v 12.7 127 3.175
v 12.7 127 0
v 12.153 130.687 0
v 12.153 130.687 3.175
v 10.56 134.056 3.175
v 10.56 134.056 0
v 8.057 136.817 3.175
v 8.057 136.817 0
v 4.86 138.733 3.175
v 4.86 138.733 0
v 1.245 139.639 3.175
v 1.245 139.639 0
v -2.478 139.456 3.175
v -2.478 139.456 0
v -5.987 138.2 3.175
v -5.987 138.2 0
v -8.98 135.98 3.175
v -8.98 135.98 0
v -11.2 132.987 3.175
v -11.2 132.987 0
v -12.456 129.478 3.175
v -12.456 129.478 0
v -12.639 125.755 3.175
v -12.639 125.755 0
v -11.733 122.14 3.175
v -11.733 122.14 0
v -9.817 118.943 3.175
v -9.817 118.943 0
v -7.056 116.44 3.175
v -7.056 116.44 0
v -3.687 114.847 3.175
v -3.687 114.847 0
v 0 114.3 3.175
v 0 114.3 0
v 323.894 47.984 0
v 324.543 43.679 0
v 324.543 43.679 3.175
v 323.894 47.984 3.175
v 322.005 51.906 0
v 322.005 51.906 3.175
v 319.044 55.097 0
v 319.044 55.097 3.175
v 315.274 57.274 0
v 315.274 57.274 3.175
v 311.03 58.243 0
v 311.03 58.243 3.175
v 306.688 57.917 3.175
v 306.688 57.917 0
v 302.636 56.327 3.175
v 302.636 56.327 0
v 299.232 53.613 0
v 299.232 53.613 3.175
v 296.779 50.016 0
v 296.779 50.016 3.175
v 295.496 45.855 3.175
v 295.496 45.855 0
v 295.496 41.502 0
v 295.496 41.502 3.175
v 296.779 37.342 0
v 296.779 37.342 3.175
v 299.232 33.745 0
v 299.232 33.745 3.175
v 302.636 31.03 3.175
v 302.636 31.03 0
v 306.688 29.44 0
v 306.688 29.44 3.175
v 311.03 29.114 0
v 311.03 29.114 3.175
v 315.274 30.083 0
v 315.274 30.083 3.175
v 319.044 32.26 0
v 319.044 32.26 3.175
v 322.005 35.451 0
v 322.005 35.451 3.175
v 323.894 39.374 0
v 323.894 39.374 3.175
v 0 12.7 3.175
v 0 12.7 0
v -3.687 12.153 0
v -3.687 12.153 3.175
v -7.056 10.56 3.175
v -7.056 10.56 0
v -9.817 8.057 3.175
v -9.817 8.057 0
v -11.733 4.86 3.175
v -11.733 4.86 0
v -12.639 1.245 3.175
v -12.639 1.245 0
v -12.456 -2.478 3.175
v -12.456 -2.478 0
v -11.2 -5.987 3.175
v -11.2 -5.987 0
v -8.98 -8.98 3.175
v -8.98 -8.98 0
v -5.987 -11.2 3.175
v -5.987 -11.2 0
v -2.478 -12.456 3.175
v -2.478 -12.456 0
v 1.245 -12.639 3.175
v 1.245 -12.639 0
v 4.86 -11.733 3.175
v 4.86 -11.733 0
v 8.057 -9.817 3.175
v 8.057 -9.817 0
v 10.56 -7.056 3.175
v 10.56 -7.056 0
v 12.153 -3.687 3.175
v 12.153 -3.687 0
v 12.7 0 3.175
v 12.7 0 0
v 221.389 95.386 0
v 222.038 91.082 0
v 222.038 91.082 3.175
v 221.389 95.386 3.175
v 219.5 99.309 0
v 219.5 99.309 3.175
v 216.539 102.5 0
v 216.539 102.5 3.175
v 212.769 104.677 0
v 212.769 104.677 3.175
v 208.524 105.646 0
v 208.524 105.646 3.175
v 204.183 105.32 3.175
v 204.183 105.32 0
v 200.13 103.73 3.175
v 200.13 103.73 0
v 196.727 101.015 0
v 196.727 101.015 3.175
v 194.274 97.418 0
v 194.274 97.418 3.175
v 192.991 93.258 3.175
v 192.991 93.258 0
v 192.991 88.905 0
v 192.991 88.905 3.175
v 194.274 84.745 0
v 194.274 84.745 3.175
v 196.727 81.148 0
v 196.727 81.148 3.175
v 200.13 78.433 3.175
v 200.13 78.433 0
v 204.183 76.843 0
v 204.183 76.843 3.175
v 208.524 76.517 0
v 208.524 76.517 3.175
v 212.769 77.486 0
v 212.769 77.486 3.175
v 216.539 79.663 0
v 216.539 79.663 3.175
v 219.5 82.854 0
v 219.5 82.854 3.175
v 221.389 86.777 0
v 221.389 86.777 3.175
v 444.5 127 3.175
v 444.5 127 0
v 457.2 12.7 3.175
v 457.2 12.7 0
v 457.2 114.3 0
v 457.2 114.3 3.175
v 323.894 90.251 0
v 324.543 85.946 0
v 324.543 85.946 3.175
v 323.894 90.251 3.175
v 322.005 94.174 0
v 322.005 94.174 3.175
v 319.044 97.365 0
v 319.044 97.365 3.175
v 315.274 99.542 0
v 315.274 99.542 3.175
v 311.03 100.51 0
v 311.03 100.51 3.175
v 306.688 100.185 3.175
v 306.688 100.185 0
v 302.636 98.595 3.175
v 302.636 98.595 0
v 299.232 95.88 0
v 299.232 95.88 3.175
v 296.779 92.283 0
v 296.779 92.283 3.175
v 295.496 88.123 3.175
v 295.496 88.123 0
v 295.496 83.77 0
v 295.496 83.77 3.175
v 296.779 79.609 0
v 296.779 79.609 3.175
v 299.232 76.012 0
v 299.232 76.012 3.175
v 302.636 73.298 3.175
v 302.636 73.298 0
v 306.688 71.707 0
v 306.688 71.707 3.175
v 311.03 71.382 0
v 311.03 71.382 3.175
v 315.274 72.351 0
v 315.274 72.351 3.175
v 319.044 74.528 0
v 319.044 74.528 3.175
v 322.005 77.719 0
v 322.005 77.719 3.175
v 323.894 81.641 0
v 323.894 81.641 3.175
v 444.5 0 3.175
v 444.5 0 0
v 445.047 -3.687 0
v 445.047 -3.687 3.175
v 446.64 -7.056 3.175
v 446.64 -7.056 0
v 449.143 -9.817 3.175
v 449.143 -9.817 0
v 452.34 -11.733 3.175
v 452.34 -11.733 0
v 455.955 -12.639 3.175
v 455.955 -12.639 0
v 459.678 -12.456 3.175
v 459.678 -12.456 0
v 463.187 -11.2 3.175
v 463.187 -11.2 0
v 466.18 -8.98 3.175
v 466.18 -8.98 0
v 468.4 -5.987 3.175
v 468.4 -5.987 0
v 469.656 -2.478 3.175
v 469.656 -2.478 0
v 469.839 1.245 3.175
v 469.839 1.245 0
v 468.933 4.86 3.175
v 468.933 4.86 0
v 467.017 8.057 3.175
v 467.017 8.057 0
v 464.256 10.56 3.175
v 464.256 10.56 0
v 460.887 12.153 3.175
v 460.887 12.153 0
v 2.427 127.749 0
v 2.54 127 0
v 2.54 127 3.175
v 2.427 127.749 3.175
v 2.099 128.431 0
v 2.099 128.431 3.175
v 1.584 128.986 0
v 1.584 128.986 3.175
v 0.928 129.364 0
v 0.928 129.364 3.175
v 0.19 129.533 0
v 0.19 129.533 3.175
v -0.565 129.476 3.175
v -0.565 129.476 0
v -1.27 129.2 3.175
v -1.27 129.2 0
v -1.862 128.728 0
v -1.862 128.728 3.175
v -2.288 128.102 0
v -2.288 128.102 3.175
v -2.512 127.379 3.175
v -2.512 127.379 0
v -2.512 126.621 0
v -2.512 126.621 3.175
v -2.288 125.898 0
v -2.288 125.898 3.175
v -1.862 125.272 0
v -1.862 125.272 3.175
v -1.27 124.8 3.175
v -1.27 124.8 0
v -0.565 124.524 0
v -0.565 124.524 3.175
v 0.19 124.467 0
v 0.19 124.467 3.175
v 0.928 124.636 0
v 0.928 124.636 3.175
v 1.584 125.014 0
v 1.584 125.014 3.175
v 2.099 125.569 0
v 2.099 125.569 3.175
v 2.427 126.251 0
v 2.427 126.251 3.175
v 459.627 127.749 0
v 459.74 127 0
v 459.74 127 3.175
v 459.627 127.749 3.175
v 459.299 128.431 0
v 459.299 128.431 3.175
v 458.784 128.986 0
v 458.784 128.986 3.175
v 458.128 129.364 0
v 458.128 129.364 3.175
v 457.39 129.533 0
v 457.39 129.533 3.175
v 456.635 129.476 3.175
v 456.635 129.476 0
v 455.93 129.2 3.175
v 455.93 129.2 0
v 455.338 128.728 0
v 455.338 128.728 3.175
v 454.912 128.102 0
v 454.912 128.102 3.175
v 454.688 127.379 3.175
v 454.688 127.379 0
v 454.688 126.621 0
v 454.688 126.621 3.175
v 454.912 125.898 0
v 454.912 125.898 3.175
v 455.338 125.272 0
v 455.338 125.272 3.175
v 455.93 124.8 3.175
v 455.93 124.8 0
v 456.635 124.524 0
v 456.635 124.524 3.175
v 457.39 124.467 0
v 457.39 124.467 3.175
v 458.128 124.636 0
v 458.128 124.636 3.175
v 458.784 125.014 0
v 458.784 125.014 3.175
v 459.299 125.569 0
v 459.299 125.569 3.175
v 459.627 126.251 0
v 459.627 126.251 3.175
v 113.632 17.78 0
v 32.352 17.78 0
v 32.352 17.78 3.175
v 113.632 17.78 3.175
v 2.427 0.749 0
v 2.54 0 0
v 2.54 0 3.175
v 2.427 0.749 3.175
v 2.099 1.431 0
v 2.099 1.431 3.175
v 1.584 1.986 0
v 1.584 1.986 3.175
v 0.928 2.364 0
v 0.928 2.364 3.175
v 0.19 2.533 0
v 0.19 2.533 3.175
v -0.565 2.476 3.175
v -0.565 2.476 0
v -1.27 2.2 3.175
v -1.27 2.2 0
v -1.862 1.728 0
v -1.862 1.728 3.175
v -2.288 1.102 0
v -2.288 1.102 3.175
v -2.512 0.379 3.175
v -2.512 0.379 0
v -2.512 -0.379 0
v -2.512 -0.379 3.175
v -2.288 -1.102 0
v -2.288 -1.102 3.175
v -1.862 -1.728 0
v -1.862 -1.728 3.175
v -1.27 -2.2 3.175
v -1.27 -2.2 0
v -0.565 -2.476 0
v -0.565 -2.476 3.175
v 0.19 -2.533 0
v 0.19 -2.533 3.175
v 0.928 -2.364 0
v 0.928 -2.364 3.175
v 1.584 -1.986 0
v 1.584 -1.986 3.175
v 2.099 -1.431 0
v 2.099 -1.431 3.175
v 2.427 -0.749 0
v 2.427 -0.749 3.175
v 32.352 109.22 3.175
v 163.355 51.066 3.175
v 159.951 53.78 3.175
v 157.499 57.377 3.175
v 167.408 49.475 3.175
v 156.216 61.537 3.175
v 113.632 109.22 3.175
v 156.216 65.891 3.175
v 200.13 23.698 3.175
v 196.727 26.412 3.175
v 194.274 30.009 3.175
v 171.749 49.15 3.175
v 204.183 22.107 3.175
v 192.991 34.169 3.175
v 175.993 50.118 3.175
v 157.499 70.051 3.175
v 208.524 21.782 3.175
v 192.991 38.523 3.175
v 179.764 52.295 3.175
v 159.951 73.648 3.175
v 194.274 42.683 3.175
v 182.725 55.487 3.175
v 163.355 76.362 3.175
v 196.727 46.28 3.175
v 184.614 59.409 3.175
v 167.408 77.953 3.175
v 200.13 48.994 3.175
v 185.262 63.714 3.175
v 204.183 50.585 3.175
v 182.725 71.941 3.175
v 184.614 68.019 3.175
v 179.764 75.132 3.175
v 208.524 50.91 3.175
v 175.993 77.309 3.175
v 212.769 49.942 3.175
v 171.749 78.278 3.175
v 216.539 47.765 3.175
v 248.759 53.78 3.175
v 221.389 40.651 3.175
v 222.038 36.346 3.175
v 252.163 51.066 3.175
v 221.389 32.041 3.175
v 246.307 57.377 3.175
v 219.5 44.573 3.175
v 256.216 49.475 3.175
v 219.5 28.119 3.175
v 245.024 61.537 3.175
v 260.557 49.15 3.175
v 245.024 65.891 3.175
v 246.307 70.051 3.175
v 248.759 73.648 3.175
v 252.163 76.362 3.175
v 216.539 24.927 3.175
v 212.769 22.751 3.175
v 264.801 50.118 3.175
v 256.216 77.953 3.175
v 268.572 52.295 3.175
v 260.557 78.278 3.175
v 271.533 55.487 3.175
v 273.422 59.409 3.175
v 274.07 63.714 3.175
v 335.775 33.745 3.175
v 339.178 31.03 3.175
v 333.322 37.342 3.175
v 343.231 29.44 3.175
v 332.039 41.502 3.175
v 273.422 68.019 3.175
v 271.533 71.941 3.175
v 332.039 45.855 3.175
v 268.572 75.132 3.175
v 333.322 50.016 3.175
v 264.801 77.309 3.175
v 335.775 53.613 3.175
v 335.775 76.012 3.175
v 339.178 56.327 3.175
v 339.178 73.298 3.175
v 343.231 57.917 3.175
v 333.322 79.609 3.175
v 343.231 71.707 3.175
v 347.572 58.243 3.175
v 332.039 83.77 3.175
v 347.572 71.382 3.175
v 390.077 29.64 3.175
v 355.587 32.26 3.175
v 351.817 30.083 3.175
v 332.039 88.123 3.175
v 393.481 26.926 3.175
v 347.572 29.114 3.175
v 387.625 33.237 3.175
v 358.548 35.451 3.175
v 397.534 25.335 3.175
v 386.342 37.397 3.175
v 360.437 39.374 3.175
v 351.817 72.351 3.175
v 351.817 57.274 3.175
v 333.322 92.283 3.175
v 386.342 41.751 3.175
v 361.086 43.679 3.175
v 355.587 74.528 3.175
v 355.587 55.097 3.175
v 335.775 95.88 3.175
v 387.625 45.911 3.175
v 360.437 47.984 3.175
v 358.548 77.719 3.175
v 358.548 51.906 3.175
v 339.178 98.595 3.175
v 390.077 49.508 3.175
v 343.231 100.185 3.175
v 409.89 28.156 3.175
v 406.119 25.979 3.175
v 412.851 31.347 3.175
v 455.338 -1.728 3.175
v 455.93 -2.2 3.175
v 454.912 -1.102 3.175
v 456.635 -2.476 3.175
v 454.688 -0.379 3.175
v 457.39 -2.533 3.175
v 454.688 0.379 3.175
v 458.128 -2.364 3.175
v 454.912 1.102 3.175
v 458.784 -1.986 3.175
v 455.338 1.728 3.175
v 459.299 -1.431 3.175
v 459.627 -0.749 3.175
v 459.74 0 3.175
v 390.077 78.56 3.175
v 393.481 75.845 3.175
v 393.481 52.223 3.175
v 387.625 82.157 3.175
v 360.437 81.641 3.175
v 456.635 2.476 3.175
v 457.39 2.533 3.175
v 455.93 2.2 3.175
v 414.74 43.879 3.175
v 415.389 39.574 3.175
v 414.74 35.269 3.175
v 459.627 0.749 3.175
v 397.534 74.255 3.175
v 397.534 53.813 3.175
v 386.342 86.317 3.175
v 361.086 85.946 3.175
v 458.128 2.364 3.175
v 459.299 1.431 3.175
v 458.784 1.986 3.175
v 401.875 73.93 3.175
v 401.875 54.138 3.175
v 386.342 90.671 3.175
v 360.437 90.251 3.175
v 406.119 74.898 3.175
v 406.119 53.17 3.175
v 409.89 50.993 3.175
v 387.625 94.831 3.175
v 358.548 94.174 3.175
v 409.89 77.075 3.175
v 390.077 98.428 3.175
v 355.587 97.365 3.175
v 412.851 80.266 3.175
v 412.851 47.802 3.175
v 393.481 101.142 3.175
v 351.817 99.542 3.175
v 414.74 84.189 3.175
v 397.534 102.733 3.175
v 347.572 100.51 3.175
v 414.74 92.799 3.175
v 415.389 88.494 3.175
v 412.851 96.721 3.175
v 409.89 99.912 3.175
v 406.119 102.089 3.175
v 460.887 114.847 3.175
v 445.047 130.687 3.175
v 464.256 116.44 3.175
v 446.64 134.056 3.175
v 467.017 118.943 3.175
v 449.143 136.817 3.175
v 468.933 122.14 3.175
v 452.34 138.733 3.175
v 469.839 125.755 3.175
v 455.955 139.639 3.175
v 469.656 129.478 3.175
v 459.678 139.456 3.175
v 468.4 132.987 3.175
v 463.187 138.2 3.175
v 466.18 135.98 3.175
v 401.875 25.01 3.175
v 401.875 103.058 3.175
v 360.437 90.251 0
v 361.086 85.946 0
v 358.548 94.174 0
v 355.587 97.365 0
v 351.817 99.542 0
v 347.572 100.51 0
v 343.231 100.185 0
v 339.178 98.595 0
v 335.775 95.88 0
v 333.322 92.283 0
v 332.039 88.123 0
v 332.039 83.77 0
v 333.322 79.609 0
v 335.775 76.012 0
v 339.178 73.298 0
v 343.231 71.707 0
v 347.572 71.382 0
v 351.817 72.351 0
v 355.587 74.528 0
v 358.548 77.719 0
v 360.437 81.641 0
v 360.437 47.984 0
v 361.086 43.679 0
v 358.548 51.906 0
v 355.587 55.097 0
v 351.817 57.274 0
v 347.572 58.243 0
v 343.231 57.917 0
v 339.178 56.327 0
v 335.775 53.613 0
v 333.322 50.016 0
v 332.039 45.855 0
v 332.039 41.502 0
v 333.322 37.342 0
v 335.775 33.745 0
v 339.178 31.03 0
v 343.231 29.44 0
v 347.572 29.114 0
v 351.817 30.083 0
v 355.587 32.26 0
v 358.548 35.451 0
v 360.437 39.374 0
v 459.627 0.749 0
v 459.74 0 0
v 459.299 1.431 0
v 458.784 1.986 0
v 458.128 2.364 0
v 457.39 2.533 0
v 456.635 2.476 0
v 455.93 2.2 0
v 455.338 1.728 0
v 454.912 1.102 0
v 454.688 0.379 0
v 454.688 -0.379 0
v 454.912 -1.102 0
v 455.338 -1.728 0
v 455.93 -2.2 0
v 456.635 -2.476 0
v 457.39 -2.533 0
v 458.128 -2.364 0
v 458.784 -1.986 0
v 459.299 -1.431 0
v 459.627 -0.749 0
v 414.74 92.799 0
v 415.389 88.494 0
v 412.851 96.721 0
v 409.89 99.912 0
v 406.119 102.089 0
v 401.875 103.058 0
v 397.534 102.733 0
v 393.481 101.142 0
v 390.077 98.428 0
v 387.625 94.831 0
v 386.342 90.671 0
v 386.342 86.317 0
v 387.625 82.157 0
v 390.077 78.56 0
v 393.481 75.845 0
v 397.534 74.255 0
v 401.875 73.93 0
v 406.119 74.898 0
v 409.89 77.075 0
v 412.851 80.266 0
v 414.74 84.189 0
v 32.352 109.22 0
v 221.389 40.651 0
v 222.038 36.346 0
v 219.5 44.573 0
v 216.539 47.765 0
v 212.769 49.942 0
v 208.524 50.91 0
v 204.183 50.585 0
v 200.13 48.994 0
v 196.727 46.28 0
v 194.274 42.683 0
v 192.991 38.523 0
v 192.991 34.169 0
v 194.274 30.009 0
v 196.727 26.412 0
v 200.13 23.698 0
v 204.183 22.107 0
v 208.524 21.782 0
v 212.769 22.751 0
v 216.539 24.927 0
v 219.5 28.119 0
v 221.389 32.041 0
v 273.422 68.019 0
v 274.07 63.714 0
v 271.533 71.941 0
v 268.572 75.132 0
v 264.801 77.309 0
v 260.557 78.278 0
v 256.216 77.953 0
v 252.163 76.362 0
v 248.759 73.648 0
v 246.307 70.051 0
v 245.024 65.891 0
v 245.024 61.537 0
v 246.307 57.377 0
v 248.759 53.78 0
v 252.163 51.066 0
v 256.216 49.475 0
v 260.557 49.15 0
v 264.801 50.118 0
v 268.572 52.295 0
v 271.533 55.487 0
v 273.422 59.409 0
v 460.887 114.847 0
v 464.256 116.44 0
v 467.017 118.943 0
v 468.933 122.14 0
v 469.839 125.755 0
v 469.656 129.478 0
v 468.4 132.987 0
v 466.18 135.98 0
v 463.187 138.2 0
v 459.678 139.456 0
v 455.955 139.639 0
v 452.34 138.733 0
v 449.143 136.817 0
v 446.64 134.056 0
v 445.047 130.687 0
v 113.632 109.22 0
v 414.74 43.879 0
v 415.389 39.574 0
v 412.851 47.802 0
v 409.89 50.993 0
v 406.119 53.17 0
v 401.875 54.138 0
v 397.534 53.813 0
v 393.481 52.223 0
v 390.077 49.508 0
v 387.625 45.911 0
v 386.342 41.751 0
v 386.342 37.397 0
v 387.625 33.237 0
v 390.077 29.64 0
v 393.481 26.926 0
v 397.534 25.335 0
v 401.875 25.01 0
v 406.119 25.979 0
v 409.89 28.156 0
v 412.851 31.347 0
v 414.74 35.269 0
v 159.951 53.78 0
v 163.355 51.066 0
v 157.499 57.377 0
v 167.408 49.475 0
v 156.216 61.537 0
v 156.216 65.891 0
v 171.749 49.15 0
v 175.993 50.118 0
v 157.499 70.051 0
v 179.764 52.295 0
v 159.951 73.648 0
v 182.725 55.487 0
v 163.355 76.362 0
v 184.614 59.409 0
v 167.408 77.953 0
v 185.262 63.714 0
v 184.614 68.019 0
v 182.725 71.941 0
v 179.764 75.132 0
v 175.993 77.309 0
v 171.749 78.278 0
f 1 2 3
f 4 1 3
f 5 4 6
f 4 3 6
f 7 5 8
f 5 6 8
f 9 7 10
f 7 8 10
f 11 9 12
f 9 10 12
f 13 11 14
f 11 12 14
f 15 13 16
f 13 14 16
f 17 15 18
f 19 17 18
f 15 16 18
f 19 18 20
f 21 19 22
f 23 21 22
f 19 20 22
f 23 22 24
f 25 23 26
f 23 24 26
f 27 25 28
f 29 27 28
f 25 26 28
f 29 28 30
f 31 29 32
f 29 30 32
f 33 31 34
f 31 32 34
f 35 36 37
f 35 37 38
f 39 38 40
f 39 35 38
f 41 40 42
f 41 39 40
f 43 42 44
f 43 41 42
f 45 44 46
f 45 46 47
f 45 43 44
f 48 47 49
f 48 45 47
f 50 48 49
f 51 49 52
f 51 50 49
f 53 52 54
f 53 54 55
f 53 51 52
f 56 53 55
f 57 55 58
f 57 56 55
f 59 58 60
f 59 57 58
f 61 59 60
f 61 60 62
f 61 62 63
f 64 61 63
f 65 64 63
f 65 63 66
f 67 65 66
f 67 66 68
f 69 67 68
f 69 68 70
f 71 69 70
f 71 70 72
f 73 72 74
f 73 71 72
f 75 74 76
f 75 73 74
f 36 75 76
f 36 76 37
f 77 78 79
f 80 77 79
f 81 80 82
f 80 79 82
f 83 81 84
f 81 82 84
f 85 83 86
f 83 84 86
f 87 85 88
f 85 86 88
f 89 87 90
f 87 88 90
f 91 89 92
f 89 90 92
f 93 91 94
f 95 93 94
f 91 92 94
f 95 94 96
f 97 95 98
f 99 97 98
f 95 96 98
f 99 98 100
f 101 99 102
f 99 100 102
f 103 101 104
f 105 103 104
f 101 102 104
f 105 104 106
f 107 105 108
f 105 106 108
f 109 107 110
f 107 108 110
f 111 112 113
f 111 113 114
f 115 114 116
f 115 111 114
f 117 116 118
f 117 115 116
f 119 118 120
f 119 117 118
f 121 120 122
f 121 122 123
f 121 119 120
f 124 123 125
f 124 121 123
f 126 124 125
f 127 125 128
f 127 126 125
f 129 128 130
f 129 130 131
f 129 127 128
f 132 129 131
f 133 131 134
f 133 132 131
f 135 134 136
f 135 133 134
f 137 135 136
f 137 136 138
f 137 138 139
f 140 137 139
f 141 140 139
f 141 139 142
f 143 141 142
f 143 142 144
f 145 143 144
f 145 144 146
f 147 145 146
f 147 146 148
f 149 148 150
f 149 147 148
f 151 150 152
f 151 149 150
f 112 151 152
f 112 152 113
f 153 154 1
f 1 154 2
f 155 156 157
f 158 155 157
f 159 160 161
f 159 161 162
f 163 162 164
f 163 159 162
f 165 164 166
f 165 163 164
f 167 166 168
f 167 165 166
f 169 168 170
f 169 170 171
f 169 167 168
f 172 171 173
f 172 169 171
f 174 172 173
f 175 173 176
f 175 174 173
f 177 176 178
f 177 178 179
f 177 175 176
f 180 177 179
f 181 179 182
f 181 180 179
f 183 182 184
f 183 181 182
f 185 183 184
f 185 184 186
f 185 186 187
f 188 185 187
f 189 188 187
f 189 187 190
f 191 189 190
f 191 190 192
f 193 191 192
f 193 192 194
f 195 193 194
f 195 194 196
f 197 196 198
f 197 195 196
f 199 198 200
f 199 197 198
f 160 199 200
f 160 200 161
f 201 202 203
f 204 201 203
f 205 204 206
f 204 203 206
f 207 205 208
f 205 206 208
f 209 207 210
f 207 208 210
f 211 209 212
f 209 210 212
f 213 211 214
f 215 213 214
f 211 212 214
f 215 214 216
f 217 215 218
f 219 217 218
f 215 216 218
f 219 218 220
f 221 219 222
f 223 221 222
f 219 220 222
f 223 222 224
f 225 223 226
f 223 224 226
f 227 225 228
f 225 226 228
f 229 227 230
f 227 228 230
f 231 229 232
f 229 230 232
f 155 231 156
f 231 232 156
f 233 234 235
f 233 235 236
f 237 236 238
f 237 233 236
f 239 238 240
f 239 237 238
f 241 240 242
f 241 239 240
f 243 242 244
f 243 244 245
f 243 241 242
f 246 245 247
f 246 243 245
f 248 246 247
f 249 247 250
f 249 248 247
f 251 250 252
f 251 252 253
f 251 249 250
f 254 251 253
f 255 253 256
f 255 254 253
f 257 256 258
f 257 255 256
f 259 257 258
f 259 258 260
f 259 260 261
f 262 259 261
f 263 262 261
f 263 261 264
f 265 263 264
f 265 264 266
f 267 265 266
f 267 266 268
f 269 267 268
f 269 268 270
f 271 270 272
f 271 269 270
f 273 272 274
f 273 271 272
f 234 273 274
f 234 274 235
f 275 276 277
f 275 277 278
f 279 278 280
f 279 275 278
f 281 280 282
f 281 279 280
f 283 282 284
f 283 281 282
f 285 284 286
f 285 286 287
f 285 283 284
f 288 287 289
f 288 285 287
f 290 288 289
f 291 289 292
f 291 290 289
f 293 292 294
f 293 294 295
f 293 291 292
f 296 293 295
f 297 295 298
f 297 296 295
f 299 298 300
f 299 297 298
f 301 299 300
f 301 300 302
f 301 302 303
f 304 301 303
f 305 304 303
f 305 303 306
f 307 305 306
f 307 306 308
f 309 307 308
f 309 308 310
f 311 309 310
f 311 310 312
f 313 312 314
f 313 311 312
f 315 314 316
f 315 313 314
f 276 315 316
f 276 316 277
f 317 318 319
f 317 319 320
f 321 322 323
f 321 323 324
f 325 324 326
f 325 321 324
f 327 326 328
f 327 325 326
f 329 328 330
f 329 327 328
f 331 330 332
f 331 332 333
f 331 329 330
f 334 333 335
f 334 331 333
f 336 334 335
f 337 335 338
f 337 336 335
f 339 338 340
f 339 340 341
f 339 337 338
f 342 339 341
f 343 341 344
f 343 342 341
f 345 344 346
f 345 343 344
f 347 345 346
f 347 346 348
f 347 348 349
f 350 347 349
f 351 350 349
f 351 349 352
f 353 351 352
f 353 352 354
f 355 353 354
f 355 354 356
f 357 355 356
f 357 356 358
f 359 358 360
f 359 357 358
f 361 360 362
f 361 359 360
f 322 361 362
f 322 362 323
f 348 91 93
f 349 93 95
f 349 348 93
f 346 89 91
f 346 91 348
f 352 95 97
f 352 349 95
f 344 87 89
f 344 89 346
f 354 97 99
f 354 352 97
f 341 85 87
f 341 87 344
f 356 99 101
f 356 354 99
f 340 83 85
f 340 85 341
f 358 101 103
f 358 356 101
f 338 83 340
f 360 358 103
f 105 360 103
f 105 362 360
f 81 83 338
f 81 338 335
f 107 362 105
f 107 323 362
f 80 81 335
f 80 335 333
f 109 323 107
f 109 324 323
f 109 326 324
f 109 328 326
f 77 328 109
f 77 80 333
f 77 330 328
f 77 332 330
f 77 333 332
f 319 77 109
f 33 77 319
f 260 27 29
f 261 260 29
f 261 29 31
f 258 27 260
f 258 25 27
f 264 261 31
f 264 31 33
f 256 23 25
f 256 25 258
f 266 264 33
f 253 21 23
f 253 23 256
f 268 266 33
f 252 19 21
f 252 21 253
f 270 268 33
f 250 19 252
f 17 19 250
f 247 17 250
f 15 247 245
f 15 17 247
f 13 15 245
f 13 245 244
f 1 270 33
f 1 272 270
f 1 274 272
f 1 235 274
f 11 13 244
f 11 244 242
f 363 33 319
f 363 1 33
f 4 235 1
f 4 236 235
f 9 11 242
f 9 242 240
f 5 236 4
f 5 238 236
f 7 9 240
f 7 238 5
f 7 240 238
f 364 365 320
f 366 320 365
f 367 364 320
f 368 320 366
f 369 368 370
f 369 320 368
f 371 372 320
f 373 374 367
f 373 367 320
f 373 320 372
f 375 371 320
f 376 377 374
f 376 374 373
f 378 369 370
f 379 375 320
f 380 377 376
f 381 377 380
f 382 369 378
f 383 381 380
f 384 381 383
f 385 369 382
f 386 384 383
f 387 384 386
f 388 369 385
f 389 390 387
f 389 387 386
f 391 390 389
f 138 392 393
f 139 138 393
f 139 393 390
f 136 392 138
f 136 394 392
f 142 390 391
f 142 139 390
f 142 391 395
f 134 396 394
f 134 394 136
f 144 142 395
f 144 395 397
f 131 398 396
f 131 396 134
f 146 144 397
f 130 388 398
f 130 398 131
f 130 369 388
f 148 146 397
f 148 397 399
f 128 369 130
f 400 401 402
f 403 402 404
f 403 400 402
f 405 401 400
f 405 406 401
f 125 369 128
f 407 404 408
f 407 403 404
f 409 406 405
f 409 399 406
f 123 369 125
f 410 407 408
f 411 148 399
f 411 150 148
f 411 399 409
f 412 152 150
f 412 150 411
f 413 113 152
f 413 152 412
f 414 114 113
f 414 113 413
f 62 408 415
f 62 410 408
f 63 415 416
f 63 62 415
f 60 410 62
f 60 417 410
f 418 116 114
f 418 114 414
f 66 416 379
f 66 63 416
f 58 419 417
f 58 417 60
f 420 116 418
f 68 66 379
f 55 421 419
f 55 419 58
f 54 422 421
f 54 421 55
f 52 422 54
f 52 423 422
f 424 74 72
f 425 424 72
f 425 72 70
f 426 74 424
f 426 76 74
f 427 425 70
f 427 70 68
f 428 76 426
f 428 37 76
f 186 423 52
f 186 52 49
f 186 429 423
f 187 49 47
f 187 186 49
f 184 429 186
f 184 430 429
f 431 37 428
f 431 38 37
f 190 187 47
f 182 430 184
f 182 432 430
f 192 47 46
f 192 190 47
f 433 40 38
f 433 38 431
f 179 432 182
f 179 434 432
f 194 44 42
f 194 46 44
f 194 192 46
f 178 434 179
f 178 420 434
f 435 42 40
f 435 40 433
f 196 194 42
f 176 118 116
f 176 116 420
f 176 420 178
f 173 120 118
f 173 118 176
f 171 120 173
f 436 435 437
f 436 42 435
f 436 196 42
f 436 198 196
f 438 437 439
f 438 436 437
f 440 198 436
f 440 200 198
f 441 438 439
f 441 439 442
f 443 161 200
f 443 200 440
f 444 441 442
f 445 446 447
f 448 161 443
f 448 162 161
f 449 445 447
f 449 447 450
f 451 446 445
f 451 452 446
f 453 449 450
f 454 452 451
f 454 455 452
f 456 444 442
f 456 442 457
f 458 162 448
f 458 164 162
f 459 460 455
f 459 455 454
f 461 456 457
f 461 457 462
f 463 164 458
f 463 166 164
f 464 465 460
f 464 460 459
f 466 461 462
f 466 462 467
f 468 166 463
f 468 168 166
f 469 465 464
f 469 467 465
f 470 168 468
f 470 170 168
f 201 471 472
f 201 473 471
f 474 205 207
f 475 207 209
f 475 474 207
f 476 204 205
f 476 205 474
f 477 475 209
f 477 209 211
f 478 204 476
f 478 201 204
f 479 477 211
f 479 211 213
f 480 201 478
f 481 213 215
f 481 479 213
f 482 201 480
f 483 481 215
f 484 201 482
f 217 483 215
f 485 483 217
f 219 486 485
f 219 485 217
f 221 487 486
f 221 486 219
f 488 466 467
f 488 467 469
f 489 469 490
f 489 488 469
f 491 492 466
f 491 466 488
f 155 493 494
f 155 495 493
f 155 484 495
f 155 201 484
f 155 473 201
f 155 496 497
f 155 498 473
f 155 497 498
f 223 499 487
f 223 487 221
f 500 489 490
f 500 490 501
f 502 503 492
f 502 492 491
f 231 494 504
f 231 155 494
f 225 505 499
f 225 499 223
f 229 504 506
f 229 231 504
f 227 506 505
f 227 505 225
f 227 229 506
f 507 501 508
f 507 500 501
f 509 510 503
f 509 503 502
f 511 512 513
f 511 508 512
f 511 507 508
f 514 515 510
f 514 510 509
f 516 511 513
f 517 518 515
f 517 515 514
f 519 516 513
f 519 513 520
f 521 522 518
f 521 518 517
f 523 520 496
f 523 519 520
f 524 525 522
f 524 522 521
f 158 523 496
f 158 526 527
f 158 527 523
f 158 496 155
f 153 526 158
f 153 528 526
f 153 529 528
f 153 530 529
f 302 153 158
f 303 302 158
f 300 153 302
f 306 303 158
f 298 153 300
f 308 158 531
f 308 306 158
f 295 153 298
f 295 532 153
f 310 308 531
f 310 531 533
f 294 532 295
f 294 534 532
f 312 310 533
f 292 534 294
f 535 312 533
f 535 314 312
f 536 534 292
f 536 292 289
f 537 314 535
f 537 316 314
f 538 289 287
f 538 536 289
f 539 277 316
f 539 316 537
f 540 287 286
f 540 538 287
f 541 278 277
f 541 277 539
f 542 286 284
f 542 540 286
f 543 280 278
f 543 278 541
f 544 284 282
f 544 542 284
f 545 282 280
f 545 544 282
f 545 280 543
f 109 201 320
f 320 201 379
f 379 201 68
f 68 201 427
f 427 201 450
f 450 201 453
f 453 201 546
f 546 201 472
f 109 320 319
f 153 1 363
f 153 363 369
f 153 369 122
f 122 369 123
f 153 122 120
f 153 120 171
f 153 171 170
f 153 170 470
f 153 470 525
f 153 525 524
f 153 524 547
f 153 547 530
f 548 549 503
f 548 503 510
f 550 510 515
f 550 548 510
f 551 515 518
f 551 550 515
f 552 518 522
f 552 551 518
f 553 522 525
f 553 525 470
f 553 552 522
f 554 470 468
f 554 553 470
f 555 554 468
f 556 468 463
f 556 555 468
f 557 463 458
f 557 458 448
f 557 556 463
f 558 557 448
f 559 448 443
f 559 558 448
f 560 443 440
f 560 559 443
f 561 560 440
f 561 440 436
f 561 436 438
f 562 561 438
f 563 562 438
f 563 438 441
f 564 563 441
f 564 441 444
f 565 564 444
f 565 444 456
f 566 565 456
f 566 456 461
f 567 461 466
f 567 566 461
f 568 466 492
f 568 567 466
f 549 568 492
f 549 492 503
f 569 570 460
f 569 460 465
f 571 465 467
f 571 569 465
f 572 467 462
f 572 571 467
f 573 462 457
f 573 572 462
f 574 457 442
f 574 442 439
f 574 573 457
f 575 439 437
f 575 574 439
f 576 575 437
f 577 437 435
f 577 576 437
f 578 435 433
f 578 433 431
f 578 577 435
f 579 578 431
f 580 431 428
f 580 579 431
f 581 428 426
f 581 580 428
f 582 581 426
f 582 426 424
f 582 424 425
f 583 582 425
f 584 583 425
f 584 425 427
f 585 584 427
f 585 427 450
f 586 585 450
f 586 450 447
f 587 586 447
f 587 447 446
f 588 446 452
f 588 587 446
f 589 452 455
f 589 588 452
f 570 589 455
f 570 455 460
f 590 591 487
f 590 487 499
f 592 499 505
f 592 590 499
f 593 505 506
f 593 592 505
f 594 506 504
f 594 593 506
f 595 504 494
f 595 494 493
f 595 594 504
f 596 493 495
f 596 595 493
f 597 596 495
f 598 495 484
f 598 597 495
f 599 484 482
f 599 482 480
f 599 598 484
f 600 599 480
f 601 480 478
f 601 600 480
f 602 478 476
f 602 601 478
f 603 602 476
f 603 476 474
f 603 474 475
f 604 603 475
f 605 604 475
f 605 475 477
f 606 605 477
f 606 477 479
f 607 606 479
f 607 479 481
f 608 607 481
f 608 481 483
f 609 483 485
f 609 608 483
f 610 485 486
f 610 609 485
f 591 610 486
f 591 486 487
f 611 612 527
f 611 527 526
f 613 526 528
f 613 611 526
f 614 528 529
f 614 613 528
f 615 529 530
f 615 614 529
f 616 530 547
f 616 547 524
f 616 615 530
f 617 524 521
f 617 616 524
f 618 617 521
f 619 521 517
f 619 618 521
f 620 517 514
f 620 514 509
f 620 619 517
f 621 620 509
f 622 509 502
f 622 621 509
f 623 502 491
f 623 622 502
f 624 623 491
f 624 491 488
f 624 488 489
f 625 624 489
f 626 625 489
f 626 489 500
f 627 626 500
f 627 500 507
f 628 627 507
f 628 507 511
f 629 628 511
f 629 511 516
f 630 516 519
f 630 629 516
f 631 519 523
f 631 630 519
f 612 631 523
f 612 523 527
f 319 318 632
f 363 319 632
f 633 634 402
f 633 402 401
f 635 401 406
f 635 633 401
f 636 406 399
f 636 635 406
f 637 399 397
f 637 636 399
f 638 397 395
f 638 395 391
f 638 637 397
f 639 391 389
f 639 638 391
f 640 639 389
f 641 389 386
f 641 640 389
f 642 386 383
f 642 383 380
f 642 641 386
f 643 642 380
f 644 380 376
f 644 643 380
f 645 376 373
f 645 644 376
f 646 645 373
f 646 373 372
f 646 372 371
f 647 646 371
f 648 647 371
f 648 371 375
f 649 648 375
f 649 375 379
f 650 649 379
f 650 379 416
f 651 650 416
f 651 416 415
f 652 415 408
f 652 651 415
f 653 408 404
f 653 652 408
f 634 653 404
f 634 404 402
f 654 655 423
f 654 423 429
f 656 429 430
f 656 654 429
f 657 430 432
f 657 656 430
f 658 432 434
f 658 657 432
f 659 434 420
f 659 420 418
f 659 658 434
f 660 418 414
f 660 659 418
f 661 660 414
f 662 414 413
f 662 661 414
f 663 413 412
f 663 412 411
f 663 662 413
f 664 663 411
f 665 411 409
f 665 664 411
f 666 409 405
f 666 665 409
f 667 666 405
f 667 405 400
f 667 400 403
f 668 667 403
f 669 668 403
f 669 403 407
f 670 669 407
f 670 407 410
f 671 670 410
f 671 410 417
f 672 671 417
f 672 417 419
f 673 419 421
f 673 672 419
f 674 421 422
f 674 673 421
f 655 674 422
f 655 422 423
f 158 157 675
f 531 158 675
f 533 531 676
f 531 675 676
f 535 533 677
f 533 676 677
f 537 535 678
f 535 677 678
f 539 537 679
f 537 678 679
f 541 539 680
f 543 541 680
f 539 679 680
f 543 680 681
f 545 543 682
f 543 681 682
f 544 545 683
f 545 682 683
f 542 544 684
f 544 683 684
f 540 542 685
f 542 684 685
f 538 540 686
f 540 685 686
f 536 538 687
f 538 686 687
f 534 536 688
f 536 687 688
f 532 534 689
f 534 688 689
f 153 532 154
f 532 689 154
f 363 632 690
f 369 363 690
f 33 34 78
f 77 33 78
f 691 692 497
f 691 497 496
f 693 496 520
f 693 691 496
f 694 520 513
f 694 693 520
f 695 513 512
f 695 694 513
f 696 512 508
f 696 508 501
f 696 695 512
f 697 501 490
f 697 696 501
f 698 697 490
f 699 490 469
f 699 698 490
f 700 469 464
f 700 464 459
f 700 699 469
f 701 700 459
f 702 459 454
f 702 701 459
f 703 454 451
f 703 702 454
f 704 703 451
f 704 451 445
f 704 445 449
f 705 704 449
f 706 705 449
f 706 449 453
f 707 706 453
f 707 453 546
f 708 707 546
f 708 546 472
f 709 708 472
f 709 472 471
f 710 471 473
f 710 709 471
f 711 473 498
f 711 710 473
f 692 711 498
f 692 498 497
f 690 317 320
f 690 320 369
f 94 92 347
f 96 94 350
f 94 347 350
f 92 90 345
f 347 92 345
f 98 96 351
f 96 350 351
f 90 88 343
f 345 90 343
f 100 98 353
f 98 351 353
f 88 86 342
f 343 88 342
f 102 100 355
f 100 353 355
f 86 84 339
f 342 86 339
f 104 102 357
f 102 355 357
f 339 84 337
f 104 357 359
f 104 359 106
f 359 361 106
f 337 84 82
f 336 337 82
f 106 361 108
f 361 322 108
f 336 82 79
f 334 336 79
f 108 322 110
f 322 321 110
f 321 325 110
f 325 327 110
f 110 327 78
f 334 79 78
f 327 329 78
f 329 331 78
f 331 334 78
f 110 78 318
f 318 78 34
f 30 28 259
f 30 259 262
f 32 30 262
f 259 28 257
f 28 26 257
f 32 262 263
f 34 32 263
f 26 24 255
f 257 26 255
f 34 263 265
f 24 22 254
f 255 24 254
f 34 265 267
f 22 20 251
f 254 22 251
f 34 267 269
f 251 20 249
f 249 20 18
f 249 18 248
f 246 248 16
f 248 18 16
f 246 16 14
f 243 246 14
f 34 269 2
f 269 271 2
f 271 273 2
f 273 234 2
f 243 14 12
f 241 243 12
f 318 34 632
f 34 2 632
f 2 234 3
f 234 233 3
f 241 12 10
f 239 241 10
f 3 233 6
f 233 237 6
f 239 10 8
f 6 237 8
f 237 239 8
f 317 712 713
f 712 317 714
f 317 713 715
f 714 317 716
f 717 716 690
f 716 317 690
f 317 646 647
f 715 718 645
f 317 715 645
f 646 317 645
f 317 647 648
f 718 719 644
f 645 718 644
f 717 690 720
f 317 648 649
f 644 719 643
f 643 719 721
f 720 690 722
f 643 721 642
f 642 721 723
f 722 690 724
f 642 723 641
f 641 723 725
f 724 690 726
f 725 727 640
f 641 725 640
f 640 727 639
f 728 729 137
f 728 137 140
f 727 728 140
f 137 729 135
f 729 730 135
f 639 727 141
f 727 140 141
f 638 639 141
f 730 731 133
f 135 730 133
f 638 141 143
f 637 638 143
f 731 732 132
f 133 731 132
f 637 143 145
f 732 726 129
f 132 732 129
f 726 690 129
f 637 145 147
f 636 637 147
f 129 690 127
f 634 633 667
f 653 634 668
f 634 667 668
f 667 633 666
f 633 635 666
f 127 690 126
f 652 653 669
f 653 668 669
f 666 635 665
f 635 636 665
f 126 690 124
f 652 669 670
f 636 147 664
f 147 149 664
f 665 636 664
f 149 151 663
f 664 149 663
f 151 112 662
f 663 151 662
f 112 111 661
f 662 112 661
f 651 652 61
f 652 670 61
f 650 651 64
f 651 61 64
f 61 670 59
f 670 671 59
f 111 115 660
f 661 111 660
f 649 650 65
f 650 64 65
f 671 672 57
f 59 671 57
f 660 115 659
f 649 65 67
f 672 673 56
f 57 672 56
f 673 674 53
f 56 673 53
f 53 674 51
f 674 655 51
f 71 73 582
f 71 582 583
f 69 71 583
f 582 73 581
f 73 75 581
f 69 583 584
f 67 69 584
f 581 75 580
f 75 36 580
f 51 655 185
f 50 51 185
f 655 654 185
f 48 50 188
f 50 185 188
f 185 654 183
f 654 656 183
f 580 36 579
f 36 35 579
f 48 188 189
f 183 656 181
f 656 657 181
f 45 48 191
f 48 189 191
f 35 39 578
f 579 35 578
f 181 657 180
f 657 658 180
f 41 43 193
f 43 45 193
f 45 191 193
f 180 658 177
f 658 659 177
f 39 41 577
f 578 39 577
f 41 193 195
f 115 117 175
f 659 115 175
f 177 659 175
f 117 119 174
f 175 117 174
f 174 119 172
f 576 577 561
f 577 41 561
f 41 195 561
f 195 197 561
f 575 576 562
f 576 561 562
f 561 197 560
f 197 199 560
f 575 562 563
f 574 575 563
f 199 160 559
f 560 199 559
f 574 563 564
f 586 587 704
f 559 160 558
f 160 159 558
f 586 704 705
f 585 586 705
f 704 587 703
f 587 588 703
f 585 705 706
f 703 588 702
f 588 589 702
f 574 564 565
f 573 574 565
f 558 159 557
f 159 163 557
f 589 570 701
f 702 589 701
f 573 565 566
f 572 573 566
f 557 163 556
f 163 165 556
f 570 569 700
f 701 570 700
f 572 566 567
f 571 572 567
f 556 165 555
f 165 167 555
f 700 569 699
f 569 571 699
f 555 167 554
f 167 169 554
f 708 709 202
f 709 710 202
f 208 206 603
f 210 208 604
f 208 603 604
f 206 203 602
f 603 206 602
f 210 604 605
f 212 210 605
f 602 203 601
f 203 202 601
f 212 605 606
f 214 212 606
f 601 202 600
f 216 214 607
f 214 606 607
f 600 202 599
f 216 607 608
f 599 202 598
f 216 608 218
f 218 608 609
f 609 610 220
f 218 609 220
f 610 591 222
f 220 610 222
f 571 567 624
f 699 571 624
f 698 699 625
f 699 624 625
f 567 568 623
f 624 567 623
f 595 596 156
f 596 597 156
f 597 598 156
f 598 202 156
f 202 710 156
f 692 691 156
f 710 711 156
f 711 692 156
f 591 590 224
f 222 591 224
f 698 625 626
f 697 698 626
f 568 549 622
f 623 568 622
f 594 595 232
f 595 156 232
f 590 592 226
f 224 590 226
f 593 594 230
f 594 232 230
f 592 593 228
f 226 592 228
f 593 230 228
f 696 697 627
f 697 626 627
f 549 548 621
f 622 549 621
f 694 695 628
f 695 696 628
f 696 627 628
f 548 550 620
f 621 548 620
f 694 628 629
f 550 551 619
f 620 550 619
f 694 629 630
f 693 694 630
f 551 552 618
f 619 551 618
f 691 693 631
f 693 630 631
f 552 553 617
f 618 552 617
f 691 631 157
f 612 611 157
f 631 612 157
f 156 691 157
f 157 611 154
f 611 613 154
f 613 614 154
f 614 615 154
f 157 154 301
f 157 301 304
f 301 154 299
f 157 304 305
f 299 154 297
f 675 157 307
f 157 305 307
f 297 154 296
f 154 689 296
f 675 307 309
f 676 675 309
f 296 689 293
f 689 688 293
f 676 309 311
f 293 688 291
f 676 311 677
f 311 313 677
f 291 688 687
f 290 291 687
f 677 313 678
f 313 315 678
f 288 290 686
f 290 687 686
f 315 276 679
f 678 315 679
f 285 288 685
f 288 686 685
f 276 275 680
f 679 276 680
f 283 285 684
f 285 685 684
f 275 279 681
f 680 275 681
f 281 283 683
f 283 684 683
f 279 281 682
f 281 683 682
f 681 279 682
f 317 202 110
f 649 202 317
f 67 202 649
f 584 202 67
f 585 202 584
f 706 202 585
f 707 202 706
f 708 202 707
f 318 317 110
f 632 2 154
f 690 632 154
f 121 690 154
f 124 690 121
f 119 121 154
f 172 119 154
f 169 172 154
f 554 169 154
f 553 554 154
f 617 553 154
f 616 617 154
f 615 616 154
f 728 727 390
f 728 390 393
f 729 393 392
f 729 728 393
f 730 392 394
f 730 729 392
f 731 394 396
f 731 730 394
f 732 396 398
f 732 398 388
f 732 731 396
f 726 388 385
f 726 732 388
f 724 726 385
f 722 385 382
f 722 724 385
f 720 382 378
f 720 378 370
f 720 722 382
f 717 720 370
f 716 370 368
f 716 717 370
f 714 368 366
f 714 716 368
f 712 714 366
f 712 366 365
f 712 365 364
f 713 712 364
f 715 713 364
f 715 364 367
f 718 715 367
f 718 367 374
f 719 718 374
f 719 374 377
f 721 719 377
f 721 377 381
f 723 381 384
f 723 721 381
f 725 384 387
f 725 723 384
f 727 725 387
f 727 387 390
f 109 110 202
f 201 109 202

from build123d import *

# Parameters (mm, degrees)
F0_R     = 2.54
F0_W     = 81.28
F0_H     = 91.44
F0_R_2   = 14.605
F1_DEPTH = 3.175


with BuildPart() as f1:
    # F0 (on Top) → F1 (new body)
    with BuildSketch(Plane.XY):
        with BuildLine():
            ThreePointArc((0, 12.7), (-8.980256, -8.980256), (12.7, 0))
            Line((12.7, 0), (444.5, 0))
            ThreePointArc((444.5, 0), (466.180256, -8.980256), (457.2, 12.7))
            Line((457.2, 12.7), (457.2, 114.3))
            ThreePointArc((457.2, 114.3), (466.180256, 135.980256), (444.5, 127))
            Line((444.5, 127), (12.7, 127))
            ThreePointArc((12.7, 127), (-8.980256, 135.980256), (0, 114.3))
            Line((0, 114.3), (0, 12.7))
        make_face()
        Circle(F0_R, mode=Mode.SUBTRACT)
        with Locations((72.991565, 63.5)):
            Rectangle(F0_W, F0_H, mode=Mode.SUBTRACT)
        with Locations((207.432806, 36.346115)):
            Circle(F0_R_2, mode=Mode.SUBTRACT)
        with Locations((457.2, 0)):
            Circle(F0_R, mode=Mode.SUBTRACT)
        with Locations((309.938095, 43.678654)):
            Circle(F0_R_2, mode=Mode.SUBTRACT)
        with Locations((346.480779, 43.678654)):
            Circle(F0_R_2, mode=Mode.SUBTRACT)
        with Locations((400.783628, 39.574253)):
            Circle(F0_R_2, mode=Mode.SUBTRACT)
        with Locations((170.657456, 63.713811)):
            Circle(F0_R_2, mode=Mode.SUBTRACT)
        with Locations((207.432806, 91.081508)):
            Circle(F0_R_2, mode=Mode.SUBTRACT)
        with Locations((0, 127)):
            Circle(F0_R, mode=Mode.SUBTRACT)
        with Locations((259.465441, 63.713811)):
            Circle(F0_R_2, mode=Mode.SUBTRACT)
        with Locations((309.938095, 85.946283)):
            Circle(F0_R_2, mode=Mode.SUBTRACT)
        with Locations((346.480779, 85.946283)):
            Circle(F0_R_2, mode=Mode.SUBTRACT)
        with Locations((400.783628, 88.493755)):
            Circle(F0_R_2, mode=Mode.SUBTRACT)
        with Locations((457.2, 127)):
            Circle(F0_R, mode=Mode.SUBTRACT)
    extrude(amount=F1_DEPTH)


solid = f1.part
